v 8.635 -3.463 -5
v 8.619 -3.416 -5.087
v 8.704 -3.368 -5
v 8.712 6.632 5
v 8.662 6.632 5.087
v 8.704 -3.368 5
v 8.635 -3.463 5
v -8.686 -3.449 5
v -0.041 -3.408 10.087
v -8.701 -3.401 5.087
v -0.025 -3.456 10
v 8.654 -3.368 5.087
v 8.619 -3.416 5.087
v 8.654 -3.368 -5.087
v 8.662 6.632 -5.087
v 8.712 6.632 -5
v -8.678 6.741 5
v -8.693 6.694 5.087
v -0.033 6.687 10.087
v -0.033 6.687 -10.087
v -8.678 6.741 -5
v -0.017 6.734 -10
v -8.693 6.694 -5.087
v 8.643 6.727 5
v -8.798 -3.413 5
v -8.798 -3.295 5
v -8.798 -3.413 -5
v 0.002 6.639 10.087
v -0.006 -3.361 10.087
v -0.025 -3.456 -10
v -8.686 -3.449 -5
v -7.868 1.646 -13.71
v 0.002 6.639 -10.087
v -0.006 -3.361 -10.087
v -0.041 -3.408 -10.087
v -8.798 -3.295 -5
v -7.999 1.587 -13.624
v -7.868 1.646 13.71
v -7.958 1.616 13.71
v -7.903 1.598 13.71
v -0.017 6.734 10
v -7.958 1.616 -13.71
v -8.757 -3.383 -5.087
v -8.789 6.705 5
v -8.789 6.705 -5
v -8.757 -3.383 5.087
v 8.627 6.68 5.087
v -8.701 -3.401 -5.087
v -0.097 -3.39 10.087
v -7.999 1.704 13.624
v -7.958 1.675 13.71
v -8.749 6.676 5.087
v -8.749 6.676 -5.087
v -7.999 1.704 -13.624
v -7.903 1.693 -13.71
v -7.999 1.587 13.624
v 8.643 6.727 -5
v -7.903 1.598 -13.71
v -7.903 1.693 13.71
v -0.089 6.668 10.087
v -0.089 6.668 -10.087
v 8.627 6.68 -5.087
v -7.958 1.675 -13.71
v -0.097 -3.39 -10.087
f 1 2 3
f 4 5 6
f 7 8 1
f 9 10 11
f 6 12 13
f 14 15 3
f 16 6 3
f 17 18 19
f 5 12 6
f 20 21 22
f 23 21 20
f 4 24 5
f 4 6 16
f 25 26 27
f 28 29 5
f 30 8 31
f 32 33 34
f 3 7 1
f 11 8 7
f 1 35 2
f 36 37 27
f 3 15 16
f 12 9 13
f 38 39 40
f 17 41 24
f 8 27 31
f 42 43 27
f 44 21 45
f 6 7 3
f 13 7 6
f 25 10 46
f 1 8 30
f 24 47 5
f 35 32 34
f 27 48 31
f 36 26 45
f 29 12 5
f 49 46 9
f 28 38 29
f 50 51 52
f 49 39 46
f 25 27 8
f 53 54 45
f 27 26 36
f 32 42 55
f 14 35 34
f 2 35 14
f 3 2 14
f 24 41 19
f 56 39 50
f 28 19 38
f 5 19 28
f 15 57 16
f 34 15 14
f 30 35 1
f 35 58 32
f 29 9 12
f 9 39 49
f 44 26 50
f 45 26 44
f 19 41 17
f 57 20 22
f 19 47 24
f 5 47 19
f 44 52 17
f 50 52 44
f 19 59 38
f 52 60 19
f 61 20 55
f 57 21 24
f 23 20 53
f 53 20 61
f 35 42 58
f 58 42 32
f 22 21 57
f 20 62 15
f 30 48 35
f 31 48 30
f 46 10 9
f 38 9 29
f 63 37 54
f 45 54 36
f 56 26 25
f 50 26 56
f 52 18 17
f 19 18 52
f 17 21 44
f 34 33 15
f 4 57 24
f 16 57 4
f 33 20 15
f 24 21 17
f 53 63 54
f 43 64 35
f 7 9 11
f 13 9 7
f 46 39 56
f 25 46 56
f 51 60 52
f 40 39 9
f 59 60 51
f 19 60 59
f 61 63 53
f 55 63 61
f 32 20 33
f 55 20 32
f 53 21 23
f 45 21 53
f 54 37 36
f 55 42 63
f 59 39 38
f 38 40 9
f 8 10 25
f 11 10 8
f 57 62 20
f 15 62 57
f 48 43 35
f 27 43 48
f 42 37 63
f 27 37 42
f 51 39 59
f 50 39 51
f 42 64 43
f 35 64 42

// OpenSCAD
// Auto-generated OpenSCAD file

    inner_points = 10*[[-0.0056399232151652795, -0.3360917085536317, -0.9999999999999865], [-0.004821322839871758, 0.663907956393025, -1.0000000000000135], [-0.005639923215391682, -0.3360917085535774, 1.0000000000000135], [-0.004821322840098161, 0.6639079563930792, 0.9999999999999865], [-0.8716650368349537, -0.3353827798330664, -0.5000000000000846], [0.8603851904045097, -0.33680063727416976, -0.4999999999998884], [-0.8708464364596602, 0.6646168851135902, -0.5000000000001116], [0.8612037907798034, 0.6631990276724868, -0.49999999999991546], [-0.8716650368350669, -0.3353827798330393, 0.49999999999991546], [0.8603851904043966, -0.33680063727414267, 0.5000000000001116], [-0.8708464364597732, 0.6646168851136173, 0.4999999999998884], [0.8612037907796903, 0.6631990276725139, 0.5000000000000846], [-0.7917964519713716, 0.1645520072181886, -1.3623724356958835], [-0.7917964519716802, 0.16455200721826255, 1.3623724356957054]];

    outer_points = 10*[[-1.0060843799292358, -0.34733073917718565, 0.3422799703240538], [-0.9936151164744732, 0.34733073917718565, -0.3769487470944146], [0.9936151164744732, -0.34733073917718565, 0.3769487470944146], [1.0060843799292358, 0.34733073917718565, -0.3422799703240538], [-0.5165877783212961, 0.27563320269095287, 0.9524512611485145], [-0.49573123333532093, -0.9702946810453241, -0.2505569321152264], [-0.5041185148665335, 0.9702946810453241, 0.233222543730046], [-0.4832619698805584, -0.27563320269095287, -0.969785649533695], [0.4832619698805584, 0.27563320269095287, 0.969785649533695], [0.5041185148665335, -0.9702946810453241, -0.233222543730046], [0.49573123333532093, 0.9702946810453241, 0.2505569321152264], [0.5165877783212961, -0.27563320269095287, -0.9524512611485145], [-1.3716391974518345, 0.5658059352223662, 0.5226991745472914], [1.35269627612334, 0.5658059352223662, 0.5699309603985218]];

    // Convex hull for inner set (I)
    module inner_hull() {
        hull() {
            for (p = inner_points) {
                translate(p) sphere(r=0.1);
            }
        }
    }

    // Convex hull for outer set (O) minus inner hull (O \ I)
    module outer_minus_inner() {
        difference() {
            hull() {
                for (p = outer_points) {
                    translate(p) sphere(r=0.1);
                }
            }
            inner_hull(); // Subtract inner hull
        }
    }

    // Convex hull for outer set (O) minus all translated inner hulls
    module outer_minus_AllTranslationInner() {
        difference() {
            hull() {
                for (p = outer_points) {
                    translate(p) sphere(r=0.1);
                }
            }
            hull() {
                translate([0,0,50]) inner_hull();
                translate([0,0,-50]) inner_hull();
            }; // Subtract translated inner hulls
        }
    }

    // Difference between outer_minus_inner and outer_minus_AllTranslationInner
    module outer_minus_inner_diff() {
        difference() {
            // Outer minus inner
            difference() {
                hull() {
                    for (p = outer_points) {
                        translate(p) sphere(r=0.1);
                    }
                }
                inner_hull();
            }

            // Subtract Outer minus AllTranslationInner
            difference() {
                hull() {
                    for (p = outer_points) {
                        translate(p) sphere(r=0.1);
                    }
                }
                hull() {
                    translate([0,0,50]) inner_hull();
                    translate([0,0,-50]) inner_hull();
                };
            }
        }
    }

    // Rendering all with colors applied
    color([1, 0, 0, 0.5]) inner_hull(); // Transparent red
    
